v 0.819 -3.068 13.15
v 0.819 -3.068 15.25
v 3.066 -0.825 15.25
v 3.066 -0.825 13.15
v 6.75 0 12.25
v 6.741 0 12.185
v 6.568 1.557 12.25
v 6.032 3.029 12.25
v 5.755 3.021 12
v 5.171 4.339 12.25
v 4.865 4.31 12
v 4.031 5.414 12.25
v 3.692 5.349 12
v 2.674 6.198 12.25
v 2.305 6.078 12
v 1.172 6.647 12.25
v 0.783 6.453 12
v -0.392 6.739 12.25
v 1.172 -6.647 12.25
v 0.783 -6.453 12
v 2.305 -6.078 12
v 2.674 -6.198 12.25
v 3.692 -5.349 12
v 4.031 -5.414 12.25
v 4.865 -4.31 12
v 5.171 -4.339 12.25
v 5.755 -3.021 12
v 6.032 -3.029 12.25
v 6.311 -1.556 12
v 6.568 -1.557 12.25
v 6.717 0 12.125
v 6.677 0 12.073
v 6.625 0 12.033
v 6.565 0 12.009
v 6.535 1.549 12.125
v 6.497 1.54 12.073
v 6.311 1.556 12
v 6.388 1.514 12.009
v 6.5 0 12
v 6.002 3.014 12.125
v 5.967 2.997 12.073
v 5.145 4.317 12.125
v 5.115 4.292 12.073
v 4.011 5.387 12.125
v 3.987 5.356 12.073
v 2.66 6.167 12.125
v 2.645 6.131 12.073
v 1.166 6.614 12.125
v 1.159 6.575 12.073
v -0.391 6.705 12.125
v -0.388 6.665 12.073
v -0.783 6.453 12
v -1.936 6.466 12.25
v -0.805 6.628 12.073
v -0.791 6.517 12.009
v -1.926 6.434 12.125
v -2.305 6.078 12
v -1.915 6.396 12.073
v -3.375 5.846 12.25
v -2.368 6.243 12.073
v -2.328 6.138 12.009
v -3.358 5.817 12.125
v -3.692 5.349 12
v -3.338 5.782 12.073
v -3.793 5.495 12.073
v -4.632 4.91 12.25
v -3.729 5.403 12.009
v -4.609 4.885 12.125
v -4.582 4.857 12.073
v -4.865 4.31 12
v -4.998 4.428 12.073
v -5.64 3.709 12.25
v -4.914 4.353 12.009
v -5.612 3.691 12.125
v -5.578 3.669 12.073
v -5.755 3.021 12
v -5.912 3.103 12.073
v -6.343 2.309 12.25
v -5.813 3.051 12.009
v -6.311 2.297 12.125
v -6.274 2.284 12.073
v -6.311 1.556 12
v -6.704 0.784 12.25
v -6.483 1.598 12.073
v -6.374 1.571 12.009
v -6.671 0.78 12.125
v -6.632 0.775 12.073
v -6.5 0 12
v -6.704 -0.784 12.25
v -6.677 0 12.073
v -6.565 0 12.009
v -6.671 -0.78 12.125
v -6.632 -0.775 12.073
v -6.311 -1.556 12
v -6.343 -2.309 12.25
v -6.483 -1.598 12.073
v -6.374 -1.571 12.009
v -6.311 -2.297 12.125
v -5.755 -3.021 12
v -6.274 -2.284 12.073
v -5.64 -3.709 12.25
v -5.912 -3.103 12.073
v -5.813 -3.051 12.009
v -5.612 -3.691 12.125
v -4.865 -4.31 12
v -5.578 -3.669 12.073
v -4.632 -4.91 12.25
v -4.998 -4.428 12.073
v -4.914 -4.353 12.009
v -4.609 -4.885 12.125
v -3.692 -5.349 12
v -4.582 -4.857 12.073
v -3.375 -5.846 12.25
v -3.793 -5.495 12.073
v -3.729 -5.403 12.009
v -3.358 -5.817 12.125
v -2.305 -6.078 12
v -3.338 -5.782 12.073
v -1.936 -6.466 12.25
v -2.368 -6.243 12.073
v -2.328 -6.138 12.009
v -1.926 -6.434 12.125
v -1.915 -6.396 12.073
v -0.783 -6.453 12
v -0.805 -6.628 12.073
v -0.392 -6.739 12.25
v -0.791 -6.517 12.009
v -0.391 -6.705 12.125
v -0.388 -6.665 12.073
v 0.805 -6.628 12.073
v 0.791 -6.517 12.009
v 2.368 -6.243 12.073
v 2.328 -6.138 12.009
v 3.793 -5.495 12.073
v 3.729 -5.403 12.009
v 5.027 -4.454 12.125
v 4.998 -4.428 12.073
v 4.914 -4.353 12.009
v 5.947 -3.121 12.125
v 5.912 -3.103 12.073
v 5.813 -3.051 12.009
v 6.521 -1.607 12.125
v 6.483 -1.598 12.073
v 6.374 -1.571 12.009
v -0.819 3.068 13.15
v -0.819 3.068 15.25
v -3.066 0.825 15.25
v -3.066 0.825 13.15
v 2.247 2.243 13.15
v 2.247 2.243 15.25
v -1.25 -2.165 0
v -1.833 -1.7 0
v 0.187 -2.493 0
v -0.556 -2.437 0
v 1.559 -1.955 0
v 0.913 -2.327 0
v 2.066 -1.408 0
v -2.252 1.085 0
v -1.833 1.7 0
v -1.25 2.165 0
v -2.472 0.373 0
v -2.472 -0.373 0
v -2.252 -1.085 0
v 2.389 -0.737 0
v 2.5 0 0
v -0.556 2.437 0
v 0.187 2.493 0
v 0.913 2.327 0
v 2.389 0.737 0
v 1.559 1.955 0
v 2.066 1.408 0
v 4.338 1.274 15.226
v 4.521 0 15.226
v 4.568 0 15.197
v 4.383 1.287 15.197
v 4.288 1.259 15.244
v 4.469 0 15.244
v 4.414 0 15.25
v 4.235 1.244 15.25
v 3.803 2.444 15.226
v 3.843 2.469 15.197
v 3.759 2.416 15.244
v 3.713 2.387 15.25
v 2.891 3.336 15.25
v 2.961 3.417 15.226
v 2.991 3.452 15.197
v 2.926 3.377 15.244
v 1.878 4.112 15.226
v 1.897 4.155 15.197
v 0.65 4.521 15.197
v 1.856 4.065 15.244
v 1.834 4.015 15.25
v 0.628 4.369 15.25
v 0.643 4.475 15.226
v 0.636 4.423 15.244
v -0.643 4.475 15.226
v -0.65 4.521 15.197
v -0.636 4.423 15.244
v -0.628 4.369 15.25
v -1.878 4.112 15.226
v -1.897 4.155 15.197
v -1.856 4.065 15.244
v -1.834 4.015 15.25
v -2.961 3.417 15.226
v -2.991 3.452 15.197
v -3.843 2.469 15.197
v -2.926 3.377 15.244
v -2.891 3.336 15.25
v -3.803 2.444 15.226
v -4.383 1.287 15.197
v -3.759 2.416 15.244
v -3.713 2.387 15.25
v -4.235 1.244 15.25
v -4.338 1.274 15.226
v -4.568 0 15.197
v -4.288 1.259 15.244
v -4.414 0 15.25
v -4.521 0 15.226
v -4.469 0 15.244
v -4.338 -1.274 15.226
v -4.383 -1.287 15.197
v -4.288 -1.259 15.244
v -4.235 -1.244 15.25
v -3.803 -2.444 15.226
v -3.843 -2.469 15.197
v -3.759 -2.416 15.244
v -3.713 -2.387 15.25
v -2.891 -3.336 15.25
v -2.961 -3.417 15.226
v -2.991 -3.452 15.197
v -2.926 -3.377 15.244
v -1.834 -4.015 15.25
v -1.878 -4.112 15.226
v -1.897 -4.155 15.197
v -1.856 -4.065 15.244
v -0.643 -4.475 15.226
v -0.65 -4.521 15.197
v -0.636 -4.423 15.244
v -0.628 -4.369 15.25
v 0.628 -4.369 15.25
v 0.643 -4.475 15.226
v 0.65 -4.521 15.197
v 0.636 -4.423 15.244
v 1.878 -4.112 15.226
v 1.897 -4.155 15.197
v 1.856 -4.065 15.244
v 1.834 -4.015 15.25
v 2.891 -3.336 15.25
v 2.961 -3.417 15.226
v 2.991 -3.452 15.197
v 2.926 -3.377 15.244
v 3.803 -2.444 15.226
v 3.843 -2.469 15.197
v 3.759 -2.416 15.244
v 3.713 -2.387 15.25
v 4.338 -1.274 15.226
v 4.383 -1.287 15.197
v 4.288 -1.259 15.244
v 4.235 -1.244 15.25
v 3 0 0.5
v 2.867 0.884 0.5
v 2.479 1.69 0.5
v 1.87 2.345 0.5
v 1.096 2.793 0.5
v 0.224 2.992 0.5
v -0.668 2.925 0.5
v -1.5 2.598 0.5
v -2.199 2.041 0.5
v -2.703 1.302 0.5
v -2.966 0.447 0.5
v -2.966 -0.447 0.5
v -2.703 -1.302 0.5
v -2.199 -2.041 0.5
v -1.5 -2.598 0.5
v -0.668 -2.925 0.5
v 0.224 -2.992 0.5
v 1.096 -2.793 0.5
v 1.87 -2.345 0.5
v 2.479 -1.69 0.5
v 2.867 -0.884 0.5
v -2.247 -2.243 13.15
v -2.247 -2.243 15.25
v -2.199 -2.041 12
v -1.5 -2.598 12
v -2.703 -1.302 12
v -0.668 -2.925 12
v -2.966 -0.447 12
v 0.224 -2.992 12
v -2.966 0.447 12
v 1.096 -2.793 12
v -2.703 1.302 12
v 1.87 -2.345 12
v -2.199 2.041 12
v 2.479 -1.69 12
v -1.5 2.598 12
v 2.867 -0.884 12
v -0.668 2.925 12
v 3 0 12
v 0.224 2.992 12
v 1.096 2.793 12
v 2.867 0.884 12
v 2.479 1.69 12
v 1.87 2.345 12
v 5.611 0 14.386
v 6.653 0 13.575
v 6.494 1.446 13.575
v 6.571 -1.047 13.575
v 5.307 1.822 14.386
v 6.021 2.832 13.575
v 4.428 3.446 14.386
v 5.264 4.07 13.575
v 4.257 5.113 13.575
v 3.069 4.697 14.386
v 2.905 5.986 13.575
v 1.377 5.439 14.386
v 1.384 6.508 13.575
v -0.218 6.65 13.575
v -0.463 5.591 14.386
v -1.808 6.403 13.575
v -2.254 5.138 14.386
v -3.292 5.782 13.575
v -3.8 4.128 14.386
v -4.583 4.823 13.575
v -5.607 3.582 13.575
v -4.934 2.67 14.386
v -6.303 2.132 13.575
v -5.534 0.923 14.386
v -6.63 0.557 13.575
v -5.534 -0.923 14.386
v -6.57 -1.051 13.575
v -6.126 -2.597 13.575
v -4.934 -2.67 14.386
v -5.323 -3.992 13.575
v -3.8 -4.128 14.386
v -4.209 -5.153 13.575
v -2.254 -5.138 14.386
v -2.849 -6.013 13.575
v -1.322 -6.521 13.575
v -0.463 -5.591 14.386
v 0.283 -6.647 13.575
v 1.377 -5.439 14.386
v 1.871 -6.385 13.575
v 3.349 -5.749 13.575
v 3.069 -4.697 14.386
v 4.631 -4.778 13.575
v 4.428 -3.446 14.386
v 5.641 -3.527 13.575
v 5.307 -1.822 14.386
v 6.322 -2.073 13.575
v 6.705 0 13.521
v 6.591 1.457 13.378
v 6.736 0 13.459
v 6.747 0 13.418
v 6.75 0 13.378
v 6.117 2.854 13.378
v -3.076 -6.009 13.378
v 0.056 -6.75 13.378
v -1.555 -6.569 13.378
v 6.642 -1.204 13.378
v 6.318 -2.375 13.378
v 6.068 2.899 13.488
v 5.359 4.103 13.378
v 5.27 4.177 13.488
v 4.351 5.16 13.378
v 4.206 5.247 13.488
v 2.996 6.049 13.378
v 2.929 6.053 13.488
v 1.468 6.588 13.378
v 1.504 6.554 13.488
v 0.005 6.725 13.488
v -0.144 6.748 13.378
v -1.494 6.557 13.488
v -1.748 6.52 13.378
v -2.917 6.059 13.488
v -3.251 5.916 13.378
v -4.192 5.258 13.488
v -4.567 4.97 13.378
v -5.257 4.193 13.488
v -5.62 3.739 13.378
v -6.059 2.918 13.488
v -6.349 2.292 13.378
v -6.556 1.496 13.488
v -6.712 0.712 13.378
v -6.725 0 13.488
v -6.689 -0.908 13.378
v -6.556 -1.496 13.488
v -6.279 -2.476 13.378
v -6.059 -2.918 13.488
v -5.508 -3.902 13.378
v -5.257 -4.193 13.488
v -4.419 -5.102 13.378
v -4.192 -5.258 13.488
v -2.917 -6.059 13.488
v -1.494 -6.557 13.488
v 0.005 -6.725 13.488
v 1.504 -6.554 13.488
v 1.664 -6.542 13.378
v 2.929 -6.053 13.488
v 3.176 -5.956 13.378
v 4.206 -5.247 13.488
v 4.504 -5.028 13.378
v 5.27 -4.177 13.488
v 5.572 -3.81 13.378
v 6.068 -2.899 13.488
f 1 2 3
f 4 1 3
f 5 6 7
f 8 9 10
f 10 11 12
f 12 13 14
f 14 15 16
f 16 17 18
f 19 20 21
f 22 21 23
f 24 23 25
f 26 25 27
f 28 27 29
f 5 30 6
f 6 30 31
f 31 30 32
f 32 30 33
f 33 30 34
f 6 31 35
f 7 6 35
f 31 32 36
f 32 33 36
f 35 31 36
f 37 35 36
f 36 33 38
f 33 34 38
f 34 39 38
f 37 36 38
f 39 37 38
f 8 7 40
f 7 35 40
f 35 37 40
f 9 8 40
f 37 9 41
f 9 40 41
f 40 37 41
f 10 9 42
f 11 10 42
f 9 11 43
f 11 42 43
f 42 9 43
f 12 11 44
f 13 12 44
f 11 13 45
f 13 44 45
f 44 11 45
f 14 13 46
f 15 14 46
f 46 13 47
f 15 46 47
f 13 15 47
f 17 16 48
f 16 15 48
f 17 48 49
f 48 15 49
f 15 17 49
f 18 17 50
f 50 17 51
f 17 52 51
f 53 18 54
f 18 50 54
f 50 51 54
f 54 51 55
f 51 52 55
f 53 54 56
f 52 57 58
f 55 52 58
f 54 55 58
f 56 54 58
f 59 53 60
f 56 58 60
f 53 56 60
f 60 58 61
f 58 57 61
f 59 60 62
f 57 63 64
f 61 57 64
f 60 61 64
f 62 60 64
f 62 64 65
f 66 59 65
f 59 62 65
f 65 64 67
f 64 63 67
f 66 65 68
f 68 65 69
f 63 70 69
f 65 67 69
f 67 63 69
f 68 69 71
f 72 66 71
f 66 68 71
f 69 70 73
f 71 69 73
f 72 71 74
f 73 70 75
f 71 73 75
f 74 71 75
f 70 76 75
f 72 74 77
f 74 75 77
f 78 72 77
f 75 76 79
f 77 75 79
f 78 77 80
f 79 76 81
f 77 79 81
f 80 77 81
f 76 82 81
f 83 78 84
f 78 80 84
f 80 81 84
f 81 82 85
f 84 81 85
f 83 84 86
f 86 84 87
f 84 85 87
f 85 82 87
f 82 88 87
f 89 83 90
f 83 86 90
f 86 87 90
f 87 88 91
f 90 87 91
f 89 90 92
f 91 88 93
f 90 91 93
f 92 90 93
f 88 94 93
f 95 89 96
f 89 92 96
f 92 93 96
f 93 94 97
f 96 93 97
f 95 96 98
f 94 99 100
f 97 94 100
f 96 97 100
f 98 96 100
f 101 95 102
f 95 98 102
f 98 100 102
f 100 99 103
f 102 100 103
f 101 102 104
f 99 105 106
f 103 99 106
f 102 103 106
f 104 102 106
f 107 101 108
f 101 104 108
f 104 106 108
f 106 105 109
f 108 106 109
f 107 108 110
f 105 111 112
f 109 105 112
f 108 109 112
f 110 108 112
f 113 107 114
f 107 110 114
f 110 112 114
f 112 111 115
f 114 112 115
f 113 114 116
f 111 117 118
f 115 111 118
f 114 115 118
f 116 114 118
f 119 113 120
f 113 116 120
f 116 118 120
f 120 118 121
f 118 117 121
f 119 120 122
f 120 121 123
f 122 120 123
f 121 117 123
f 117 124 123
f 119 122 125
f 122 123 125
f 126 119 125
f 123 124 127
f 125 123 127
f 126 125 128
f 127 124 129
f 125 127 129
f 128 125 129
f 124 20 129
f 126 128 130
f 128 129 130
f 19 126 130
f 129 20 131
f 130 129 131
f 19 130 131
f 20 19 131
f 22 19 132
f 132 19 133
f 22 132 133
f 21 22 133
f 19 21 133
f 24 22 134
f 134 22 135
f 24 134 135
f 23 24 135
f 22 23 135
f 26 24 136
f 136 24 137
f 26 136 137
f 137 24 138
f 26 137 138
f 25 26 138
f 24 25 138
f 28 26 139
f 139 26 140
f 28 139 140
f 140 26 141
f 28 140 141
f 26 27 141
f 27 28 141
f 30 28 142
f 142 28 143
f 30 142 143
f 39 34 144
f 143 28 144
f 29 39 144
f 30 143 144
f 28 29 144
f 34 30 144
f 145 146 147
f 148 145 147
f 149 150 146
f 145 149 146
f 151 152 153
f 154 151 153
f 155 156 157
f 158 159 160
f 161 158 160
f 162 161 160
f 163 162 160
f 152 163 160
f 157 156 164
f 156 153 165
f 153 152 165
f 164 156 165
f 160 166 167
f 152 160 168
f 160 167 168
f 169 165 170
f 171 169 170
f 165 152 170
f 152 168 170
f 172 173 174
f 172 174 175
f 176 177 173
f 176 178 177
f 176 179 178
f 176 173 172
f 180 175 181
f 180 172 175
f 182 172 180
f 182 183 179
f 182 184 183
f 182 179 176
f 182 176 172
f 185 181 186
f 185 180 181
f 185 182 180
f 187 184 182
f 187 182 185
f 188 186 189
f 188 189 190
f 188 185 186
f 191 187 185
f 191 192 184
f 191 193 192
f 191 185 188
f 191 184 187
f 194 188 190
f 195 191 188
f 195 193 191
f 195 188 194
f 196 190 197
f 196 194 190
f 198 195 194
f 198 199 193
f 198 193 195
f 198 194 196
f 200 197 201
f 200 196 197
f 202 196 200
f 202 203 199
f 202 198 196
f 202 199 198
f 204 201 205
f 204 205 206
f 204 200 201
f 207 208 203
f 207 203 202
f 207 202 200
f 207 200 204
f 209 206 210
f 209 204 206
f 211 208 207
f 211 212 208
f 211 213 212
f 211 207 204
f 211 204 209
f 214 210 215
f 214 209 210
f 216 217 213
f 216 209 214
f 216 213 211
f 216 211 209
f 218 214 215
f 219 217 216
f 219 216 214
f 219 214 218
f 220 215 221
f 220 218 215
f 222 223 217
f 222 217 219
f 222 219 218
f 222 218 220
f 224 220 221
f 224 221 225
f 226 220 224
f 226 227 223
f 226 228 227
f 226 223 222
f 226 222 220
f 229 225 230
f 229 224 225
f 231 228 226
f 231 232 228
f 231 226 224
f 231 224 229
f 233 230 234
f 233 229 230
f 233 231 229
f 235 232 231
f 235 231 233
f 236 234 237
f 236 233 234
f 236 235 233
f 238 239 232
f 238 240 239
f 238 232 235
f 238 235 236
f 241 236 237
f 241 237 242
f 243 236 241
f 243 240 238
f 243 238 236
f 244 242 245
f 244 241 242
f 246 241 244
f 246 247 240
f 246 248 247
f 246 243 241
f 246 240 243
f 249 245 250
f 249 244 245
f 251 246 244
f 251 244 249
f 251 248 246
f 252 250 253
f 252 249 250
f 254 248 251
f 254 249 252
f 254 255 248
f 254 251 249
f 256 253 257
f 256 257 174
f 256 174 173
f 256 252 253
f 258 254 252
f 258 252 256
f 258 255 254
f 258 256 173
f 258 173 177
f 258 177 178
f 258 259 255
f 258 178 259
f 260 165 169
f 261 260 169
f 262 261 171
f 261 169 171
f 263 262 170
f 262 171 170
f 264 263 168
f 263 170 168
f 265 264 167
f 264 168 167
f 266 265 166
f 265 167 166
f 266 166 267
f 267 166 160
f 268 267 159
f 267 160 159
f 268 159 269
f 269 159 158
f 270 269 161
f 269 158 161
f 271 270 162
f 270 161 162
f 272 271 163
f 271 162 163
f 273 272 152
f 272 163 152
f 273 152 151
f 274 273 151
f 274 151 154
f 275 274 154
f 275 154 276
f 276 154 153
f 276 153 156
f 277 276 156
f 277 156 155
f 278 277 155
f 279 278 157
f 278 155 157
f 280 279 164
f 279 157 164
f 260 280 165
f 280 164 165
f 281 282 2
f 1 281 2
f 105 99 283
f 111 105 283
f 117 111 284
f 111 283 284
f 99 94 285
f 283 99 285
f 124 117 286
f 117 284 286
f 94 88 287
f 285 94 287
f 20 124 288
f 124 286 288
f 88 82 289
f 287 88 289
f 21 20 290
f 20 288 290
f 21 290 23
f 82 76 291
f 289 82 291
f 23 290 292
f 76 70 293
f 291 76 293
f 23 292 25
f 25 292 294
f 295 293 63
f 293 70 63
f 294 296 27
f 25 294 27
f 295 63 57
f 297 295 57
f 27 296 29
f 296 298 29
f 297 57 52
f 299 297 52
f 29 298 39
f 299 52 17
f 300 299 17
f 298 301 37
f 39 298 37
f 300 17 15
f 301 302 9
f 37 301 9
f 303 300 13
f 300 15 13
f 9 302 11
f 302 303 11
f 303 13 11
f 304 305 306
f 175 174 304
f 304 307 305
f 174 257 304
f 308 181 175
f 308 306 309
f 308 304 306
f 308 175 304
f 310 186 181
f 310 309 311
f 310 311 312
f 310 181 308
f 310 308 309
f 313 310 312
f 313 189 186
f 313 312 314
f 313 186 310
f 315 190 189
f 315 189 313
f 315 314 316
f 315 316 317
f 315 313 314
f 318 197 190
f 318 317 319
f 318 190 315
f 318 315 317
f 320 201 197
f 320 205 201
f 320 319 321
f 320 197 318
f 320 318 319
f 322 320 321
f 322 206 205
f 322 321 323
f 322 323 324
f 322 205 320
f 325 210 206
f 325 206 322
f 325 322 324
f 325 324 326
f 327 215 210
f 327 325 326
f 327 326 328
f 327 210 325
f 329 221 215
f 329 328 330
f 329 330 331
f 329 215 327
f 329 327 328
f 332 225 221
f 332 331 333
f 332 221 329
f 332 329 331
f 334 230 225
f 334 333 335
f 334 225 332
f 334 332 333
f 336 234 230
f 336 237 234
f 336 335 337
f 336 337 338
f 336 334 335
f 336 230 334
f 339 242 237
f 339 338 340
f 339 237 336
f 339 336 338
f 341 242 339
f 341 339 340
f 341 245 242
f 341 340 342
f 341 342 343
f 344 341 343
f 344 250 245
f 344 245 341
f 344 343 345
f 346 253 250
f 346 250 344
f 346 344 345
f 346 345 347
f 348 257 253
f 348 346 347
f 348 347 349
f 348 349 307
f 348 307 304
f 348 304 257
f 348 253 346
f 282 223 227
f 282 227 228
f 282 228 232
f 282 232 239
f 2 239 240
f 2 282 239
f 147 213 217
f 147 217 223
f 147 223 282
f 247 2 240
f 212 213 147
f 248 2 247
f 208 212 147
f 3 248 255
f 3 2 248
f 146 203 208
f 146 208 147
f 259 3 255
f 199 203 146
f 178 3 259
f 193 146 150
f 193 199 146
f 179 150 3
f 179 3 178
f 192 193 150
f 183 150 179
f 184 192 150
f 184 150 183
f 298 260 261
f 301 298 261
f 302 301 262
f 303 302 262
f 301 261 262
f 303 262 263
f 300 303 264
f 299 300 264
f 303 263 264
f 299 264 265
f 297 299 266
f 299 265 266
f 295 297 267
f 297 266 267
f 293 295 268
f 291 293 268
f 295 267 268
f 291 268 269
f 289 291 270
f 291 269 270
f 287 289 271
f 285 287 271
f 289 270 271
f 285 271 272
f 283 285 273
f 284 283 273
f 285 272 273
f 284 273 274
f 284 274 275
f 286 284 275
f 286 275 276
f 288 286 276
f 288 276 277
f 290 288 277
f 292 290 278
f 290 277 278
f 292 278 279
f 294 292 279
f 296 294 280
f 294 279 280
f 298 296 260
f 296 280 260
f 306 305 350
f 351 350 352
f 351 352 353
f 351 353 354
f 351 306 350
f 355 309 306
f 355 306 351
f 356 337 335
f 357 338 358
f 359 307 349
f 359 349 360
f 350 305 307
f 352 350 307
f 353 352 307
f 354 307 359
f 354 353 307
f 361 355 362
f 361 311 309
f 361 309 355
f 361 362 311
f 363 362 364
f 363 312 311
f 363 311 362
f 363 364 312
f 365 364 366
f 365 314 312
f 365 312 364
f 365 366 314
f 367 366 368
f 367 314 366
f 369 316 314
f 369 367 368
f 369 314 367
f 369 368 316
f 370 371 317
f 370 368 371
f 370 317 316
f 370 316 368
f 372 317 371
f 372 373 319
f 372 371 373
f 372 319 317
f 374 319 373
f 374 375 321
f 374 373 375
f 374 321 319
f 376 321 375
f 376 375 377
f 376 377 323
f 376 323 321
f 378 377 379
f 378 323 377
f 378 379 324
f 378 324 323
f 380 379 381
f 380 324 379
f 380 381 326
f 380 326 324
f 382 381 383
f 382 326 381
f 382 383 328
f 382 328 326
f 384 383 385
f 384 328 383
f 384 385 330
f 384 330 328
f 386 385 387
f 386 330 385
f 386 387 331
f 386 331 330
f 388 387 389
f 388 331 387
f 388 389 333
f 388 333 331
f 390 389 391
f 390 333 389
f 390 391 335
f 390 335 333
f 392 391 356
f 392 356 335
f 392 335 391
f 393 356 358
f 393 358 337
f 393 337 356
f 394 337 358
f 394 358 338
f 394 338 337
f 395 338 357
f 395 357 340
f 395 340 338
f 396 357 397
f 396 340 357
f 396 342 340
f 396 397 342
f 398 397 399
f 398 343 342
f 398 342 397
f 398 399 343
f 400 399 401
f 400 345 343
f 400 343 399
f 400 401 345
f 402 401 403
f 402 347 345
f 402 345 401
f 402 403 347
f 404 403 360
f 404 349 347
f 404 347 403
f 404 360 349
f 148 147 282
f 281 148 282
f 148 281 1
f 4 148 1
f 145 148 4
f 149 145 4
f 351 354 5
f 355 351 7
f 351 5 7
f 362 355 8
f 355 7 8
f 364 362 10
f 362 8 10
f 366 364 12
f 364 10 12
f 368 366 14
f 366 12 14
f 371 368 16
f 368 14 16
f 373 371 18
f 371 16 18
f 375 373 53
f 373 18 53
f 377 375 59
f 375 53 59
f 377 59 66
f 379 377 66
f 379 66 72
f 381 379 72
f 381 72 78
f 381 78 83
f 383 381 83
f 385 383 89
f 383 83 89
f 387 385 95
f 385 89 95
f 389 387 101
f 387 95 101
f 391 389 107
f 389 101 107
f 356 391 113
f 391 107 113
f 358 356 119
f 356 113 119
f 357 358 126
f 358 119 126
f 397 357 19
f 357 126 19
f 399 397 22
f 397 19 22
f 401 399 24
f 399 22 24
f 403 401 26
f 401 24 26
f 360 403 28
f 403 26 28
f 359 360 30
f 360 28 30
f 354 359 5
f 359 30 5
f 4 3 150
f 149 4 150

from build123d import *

# Parameters (mm, degrees)
SKETCH1_R           = 3
BOSS_EXTRUDE1_DEPTH = 12
SKETCH2_R           = 6.75
BOSS_EXTRUDE2_DEPTH = 1.5
SKETCH3_R           = 4.5
FILLET1_R           = 0.25
CUT_EXTRUDE1_DEPTH  = 2.1
CHAMFER2_SIZE       = 0.5


with BuildPart() as part:
    # Sketch1 → Boss-Extrude1 (new body)
    with BuildSketch(Plane.XY):
        Circle(SKETCH1_R)
    extrude(amount=BOSS_EXTRUDE1_DEPTH)

    # Sketch2 → Boss-Extrude2 (add)
    with BuildSketch(Plane.XY.offset(12)):
        Circle(SKETCH2_R)
    extrude(amount=BOSS_EXTRUDE2_DEPTH)

    # Sketch3 → section 1 of loft1
    with BuildSketch(Plane.XY.offset(15.25), mode=Mode.PRIVATE) as loft1_s1:
        Circle(SKETCH3_R)
    # loft up to a face of the part (loft1)
    loft([Face(Wire([part.edges().sort_by_distance((-4.620692965, 4.920538235, 13.5))[0]])), loft1_s1.sketch])

    # Fillet1
    fillet1_edges = [part.edges().sort_by_distance(p)[0] for p in [
        (-6.75, 0, 12),
        (-6.75, 0, 13.5),
        (-4.5, 0, 15.25),
    ]]
    fillet(fillet1_edges, radius=FILLET1_R)

    # Sketch6 → Cut-Extrude1 (cut)
    with BuildSketch(Plane.XY.offset(15.25)):
        Polygon((3.066485121, -0.824622541), (2.24738663, 2.243342745), (-0.819098491, 3.067965286), (-3.066485121, 0.824622541), (-2.24738663, -2.243342745), (0.819098491, -3.067965286), align=None)
    extrude(amount=-CUT_EXTRUDE1_DEPTH, mode=Mode.SUBTRACT)

    # Chamfer2
    chamfer2_edges = [part.edges().sort_by_distance(p)[0] for p in [
        (-3, 0, 0),
    ]]
    chamfer(chamfer2_edges, length=CHAMFER2_SIZE)


solid = part.part
